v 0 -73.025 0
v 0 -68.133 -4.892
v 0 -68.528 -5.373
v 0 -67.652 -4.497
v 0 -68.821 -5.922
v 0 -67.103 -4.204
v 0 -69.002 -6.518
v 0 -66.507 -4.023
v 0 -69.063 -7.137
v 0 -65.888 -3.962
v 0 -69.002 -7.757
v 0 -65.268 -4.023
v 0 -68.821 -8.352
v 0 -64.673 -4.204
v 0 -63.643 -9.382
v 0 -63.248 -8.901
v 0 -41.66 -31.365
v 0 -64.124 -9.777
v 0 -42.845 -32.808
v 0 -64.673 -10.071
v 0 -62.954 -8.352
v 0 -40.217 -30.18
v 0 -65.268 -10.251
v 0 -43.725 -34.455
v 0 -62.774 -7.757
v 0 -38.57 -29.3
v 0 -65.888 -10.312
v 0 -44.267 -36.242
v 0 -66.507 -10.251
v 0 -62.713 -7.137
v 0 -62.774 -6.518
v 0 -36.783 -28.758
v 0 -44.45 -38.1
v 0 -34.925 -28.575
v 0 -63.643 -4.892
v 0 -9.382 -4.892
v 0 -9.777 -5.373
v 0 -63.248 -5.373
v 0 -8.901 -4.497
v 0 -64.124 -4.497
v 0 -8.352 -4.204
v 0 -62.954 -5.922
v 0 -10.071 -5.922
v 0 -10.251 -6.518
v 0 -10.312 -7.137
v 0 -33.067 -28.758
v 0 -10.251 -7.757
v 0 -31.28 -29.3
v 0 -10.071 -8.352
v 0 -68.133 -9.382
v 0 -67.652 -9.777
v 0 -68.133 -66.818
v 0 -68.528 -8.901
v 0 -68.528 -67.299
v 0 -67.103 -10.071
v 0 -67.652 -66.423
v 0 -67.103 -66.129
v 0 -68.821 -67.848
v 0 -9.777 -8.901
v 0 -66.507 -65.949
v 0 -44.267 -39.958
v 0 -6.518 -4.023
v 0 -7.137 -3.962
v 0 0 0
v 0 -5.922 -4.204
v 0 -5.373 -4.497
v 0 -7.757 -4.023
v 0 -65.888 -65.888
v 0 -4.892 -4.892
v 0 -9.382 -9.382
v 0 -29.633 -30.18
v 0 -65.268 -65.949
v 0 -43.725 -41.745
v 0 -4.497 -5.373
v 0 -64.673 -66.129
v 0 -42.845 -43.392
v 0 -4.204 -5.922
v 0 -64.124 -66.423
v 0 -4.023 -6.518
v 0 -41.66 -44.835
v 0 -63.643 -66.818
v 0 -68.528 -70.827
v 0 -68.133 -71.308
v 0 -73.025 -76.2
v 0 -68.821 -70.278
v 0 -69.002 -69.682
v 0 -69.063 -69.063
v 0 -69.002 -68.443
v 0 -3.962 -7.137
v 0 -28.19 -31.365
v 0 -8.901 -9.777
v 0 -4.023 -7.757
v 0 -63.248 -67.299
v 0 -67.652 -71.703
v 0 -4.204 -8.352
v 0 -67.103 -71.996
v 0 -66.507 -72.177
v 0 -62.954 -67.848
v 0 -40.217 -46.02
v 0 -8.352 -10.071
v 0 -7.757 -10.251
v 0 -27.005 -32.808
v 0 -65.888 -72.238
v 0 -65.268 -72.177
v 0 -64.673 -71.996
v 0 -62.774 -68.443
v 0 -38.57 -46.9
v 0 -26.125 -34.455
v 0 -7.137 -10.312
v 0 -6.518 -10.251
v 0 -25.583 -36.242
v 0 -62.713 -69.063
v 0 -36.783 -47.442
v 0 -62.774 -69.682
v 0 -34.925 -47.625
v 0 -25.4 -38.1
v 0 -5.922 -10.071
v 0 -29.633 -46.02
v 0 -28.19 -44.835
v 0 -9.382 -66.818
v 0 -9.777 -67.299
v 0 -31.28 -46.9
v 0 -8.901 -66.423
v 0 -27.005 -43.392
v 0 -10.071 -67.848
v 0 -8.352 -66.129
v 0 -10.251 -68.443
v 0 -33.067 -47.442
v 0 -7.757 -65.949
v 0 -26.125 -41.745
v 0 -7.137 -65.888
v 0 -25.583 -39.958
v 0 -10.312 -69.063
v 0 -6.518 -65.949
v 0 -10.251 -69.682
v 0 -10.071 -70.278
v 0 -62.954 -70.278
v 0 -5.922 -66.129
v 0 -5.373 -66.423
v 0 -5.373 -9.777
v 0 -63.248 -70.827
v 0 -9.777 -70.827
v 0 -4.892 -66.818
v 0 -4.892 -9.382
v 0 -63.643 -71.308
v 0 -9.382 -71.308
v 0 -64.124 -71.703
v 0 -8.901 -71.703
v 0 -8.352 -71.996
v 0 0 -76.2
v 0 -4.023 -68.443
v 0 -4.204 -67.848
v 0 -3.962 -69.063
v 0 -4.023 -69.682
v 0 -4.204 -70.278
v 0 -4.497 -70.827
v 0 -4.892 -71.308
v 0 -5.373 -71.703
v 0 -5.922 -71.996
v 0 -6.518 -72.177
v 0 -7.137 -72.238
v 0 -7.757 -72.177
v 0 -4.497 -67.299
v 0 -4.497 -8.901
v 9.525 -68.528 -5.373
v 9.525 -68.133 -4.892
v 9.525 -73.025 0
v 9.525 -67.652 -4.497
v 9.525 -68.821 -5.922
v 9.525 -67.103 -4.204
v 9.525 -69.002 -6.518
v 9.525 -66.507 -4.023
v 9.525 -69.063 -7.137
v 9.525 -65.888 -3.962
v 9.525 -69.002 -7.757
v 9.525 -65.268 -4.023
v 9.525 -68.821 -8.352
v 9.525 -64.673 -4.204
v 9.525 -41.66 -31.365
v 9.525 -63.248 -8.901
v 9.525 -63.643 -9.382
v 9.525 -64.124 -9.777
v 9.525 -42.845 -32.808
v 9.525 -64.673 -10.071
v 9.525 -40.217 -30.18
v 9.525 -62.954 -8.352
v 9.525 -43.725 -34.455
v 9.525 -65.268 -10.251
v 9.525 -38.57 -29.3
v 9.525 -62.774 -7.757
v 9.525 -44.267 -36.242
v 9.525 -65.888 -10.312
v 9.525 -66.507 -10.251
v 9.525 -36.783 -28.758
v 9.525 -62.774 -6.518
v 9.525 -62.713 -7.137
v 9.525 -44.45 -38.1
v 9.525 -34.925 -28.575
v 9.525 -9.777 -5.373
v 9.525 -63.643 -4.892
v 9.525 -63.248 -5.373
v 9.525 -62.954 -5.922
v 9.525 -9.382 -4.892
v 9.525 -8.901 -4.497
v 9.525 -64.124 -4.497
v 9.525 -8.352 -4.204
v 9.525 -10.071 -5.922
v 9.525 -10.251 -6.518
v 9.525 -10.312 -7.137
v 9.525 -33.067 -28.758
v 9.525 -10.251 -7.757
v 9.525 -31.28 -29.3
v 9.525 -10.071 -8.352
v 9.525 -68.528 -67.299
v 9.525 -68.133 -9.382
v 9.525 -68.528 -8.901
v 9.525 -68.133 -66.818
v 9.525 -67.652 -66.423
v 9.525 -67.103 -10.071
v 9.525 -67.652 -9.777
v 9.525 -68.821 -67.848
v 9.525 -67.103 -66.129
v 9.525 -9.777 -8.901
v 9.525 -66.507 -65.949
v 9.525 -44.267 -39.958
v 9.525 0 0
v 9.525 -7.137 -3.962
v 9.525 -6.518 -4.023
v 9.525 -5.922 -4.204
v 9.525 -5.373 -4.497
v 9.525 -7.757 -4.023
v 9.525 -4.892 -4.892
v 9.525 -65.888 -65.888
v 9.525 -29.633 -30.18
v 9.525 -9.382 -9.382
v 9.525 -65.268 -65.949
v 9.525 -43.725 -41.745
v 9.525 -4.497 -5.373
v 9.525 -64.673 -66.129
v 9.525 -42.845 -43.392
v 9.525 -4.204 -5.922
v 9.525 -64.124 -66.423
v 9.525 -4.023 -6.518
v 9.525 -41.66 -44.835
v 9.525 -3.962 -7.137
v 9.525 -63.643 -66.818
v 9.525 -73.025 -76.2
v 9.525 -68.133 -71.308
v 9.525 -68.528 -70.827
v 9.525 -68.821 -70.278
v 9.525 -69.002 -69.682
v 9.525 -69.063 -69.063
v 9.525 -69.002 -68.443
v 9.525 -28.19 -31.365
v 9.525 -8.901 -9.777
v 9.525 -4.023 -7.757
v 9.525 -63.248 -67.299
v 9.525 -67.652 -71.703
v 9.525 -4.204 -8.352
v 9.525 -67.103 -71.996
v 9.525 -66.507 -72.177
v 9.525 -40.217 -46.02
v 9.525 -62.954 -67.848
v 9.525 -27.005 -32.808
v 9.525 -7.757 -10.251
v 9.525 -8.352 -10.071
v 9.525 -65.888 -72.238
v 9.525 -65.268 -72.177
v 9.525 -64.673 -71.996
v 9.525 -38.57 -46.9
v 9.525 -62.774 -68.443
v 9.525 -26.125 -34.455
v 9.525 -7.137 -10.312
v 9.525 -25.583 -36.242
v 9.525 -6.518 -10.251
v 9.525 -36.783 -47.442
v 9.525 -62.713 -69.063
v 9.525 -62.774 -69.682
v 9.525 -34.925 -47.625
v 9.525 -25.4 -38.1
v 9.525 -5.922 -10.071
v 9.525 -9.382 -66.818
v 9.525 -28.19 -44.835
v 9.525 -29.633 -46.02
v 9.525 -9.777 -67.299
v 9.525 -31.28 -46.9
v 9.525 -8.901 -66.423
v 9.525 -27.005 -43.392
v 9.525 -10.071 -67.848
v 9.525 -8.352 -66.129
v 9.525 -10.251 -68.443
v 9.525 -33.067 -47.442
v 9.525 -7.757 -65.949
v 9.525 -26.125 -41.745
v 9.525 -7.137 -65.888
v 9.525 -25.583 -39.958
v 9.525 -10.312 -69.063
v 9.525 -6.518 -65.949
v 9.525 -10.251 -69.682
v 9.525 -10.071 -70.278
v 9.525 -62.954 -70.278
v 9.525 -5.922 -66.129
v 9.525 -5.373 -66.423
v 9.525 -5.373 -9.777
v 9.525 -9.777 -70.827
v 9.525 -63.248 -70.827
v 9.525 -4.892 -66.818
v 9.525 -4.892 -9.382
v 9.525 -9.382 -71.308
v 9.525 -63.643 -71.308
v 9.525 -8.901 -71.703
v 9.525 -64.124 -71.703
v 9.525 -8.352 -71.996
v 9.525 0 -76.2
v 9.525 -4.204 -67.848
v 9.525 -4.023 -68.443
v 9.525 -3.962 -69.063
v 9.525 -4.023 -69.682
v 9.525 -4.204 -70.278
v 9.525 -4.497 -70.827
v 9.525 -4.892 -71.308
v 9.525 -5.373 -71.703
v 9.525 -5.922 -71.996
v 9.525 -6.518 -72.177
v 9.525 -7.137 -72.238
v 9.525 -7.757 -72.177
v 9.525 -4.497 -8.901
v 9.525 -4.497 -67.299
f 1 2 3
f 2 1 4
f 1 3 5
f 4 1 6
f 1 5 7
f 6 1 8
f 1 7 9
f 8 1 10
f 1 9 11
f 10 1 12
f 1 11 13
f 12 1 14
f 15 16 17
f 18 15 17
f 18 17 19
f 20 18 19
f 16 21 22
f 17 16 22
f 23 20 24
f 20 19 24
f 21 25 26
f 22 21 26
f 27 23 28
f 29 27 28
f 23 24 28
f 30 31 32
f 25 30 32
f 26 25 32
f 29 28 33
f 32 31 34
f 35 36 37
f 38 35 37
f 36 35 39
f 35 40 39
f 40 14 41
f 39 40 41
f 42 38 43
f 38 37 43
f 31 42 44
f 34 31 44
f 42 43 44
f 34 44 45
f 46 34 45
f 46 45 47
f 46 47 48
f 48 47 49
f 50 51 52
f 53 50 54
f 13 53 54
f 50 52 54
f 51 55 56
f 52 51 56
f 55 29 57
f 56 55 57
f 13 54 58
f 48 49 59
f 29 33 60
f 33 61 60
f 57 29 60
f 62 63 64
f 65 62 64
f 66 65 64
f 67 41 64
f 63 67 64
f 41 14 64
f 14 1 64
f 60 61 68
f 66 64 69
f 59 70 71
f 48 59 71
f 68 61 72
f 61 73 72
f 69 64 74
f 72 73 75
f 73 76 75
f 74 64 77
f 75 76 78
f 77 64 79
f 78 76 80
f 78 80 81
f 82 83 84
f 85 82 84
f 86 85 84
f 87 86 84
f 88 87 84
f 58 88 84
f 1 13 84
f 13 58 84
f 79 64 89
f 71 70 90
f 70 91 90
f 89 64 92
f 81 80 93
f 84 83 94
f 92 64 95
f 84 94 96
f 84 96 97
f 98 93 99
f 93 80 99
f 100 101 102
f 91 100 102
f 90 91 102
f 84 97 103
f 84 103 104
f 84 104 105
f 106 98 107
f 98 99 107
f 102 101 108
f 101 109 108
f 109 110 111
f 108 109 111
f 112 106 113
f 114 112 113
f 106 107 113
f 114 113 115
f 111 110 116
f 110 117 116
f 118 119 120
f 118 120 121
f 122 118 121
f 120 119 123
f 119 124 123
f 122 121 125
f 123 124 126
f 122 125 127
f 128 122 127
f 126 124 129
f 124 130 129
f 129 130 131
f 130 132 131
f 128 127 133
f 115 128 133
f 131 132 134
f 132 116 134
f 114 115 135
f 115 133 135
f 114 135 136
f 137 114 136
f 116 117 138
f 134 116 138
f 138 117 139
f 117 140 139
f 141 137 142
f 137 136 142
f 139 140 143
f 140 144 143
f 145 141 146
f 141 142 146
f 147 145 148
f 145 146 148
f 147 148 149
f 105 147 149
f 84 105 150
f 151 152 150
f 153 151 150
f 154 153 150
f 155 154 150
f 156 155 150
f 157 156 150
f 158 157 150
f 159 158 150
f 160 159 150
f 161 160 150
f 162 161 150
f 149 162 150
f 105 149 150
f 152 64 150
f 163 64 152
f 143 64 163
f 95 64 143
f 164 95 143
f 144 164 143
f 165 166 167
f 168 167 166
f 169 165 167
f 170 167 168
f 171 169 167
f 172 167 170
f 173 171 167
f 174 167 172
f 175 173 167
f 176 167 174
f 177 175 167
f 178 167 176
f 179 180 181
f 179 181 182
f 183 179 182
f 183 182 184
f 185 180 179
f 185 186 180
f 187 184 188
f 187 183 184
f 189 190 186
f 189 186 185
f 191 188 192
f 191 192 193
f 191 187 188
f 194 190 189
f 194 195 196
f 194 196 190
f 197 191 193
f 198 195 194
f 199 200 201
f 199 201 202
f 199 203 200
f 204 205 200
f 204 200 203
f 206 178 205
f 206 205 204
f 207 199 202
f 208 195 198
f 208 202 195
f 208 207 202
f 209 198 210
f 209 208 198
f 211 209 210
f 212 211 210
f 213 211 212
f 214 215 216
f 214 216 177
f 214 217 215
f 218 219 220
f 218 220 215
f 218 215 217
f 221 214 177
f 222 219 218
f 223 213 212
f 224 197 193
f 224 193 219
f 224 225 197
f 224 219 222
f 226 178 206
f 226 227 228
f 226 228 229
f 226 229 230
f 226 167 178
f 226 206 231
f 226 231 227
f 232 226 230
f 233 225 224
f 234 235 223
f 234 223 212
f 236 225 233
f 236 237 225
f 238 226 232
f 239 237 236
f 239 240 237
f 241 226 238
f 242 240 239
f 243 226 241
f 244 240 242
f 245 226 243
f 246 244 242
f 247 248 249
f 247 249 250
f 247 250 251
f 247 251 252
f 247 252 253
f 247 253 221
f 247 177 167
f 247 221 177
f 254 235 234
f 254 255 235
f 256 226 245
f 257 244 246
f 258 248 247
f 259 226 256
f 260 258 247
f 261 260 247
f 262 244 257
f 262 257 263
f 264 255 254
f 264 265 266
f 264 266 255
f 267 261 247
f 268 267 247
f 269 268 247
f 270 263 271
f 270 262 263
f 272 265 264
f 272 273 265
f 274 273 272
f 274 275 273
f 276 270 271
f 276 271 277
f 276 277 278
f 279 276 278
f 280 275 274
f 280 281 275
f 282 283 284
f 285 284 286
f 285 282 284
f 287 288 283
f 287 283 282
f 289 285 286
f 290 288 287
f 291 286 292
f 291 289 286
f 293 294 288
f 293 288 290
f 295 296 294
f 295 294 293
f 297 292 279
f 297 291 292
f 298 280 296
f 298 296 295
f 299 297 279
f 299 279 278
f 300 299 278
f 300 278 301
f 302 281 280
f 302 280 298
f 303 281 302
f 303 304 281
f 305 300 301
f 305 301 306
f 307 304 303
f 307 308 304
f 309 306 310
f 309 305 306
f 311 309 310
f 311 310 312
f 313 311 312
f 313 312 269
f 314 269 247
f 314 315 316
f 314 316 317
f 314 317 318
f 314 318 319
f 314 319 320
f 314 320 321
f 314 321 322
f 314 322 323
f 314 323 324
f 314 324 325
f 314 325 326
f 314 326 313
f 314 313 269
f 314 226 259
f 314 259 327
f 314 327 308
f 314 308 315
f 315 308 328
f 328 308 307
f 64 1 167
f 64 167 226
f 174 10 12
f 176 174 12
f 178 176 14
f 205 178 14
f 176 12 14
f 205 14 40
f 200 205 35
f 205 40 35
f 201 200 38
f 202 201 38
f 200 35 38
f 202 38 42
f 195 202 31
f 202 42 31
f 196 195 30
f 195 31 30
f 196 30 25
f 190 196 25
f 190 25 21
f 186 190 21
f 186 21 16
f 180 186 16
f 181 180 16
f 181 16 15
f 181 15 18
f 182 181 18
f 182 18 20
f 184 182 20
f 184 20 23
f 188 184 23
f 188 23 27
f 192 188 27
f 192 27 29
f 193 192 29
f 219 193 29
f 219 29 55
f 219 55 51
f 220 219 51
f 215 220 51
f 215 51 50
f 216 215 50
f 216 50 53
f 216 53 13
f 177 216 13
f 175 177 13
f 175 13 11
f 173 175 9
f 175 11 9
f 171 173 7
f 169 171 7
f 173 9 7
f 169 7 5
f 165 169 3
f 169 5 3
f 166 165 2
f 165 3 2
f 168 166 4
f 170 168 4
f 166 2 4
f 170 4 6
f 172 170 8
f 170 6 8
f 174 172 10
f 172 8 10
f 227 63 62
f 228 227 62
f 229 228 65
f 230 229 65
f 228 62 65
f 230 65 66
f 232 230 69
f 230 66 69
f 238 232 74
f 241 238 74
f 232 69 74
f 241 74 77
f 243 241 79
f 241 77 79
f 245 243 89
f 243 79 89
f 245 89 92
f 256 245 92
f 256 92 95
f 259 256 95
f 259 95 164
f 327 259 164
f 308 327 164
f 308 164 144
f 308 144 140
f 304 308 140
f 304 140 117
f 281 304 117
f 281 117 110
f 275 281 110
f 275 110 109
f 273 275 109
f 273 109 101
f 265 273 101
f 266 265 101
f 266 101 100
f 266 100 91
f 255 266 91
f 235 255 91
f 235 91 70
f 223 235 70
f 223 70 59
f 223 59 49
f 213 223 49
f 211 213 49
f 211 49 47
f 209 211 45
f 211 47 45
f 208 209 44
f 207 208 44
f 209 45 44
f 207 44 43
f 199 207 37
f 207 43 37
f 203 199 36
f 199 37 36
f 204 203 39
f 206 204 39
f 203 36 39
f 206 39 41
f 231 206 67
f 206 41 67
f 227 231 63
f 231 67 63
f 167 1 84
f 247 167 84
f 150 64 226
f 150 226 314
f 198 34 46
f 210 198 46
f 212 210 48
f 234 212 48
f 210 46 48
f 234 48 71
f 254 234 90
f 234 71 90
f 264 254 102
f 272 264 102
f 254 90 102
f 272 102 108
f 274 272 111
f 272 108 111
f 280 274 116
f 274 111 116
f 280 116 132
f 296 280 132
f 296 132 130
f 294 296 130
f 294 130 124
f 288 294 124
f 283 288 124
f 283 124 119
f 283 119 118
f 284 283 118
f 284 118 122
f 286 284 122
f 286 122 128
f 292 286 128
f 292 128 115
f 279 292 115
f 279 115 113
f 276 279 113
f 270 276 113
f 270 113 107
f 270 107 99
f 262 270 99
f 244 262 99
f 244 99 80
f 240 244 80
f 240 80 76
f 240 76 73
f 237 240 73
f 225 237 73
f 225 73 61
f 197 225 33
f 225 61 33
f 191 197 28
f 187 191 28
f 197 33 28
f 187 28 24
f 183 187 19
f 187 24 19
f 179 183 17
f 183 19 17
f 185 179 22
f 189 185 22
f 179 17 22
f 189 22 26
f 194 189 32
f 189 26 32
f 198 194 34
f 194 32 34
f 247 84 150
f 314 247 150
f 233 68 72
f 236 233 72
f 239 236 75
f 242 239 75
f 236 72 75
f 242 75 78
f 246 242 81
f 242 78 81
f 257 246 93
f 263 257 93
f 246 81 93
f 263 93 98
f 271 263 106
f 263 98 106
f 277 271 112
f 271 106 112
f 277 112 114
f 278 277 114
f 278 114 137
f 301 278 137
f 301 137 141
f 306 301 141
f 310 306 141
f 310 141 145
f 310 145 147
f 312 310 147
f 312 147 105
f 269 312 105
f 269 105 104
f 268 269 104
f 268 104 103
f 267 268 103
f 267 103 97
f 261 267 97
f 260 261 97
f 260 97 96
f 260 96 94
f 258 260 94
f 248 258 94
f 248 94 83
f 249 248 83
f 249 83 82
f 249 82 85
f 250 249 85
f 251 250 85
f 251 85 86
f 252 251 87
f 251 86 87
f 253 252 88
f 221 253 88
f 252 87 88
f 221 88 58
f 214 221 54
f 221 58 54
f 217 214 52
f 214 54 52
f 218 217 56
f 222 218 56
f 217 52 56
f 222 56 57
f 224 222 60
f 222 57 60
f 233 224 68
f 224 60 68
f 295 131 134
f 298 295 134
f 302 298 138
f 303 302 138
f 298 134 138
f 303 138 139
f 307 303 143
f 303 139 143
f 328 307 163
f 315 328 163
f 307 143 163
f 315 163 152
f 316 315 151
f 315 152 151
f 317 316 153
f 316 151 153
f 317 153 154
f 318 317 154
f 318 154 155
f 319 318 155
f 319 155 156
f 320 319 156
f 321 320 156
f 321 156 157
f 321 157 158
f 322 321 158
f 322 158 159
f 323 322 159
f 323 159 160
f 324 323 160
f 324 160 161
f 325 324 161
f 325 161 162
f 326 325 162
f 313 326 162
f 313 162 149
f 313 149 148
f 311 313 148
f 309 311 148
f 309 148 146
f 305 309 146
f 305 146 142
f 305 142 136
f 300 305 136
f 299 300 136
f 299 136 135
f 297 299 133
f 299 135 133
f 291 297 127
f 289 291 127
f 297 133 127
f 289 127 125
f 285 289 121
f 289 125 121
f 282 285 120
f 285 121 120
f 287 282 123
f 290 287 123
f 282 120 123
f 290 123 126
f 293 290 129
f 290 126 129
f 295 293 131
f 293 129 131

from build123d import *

# Parameters (mm, degrees)
SKETCH1_W          = 76.2
SKETCH1_H          = 73.025
EXTRUDE1_DEPTH     = 9.525
SKETCH8_R          = 3.175
SKETCH8_R_2        = 9.525
CUT_EXTRUDE5_DEPTH = 10.525


with BuildPart() as part:
    # Sketch1 → Extrude1 (new body)
    with BuildSketch(Plane(origin=(0, 0, 0), x_dir=(0, 0, -1), z_dir=(1, 0, 0))):
        with Locations((38.1, -36.5125)):
            Rectangle(SKETCH1_W, SKETCH1_H)
    extrude(amount=EXTRUDE1_DEPTH)

    # Sketch8 → Cut-Extrude5 (cut, through all)
    with BuildSketch(Plane.ZY):
        with Locations((-7.1374, -7.1374)):
            Circle(SKETCH8_R)
        with Locations((-69.0626, -7.1374)):
            Circle(SKETCH8_R)
        with Locations((-69.0626, -65.8876)):
            Circle(SKETCH8_R)
        with Locations((-7.1374, -65.8876)):
            Circle(SKETCH8_R)
        with Locations((-38.1, -34.925)):
            Circle(SKETCH8_R_2)
    extrude(amount=-CUT_EXTRUDE5_DEPTH, mode=Mode.SUBTRACT)


solid = part.part
